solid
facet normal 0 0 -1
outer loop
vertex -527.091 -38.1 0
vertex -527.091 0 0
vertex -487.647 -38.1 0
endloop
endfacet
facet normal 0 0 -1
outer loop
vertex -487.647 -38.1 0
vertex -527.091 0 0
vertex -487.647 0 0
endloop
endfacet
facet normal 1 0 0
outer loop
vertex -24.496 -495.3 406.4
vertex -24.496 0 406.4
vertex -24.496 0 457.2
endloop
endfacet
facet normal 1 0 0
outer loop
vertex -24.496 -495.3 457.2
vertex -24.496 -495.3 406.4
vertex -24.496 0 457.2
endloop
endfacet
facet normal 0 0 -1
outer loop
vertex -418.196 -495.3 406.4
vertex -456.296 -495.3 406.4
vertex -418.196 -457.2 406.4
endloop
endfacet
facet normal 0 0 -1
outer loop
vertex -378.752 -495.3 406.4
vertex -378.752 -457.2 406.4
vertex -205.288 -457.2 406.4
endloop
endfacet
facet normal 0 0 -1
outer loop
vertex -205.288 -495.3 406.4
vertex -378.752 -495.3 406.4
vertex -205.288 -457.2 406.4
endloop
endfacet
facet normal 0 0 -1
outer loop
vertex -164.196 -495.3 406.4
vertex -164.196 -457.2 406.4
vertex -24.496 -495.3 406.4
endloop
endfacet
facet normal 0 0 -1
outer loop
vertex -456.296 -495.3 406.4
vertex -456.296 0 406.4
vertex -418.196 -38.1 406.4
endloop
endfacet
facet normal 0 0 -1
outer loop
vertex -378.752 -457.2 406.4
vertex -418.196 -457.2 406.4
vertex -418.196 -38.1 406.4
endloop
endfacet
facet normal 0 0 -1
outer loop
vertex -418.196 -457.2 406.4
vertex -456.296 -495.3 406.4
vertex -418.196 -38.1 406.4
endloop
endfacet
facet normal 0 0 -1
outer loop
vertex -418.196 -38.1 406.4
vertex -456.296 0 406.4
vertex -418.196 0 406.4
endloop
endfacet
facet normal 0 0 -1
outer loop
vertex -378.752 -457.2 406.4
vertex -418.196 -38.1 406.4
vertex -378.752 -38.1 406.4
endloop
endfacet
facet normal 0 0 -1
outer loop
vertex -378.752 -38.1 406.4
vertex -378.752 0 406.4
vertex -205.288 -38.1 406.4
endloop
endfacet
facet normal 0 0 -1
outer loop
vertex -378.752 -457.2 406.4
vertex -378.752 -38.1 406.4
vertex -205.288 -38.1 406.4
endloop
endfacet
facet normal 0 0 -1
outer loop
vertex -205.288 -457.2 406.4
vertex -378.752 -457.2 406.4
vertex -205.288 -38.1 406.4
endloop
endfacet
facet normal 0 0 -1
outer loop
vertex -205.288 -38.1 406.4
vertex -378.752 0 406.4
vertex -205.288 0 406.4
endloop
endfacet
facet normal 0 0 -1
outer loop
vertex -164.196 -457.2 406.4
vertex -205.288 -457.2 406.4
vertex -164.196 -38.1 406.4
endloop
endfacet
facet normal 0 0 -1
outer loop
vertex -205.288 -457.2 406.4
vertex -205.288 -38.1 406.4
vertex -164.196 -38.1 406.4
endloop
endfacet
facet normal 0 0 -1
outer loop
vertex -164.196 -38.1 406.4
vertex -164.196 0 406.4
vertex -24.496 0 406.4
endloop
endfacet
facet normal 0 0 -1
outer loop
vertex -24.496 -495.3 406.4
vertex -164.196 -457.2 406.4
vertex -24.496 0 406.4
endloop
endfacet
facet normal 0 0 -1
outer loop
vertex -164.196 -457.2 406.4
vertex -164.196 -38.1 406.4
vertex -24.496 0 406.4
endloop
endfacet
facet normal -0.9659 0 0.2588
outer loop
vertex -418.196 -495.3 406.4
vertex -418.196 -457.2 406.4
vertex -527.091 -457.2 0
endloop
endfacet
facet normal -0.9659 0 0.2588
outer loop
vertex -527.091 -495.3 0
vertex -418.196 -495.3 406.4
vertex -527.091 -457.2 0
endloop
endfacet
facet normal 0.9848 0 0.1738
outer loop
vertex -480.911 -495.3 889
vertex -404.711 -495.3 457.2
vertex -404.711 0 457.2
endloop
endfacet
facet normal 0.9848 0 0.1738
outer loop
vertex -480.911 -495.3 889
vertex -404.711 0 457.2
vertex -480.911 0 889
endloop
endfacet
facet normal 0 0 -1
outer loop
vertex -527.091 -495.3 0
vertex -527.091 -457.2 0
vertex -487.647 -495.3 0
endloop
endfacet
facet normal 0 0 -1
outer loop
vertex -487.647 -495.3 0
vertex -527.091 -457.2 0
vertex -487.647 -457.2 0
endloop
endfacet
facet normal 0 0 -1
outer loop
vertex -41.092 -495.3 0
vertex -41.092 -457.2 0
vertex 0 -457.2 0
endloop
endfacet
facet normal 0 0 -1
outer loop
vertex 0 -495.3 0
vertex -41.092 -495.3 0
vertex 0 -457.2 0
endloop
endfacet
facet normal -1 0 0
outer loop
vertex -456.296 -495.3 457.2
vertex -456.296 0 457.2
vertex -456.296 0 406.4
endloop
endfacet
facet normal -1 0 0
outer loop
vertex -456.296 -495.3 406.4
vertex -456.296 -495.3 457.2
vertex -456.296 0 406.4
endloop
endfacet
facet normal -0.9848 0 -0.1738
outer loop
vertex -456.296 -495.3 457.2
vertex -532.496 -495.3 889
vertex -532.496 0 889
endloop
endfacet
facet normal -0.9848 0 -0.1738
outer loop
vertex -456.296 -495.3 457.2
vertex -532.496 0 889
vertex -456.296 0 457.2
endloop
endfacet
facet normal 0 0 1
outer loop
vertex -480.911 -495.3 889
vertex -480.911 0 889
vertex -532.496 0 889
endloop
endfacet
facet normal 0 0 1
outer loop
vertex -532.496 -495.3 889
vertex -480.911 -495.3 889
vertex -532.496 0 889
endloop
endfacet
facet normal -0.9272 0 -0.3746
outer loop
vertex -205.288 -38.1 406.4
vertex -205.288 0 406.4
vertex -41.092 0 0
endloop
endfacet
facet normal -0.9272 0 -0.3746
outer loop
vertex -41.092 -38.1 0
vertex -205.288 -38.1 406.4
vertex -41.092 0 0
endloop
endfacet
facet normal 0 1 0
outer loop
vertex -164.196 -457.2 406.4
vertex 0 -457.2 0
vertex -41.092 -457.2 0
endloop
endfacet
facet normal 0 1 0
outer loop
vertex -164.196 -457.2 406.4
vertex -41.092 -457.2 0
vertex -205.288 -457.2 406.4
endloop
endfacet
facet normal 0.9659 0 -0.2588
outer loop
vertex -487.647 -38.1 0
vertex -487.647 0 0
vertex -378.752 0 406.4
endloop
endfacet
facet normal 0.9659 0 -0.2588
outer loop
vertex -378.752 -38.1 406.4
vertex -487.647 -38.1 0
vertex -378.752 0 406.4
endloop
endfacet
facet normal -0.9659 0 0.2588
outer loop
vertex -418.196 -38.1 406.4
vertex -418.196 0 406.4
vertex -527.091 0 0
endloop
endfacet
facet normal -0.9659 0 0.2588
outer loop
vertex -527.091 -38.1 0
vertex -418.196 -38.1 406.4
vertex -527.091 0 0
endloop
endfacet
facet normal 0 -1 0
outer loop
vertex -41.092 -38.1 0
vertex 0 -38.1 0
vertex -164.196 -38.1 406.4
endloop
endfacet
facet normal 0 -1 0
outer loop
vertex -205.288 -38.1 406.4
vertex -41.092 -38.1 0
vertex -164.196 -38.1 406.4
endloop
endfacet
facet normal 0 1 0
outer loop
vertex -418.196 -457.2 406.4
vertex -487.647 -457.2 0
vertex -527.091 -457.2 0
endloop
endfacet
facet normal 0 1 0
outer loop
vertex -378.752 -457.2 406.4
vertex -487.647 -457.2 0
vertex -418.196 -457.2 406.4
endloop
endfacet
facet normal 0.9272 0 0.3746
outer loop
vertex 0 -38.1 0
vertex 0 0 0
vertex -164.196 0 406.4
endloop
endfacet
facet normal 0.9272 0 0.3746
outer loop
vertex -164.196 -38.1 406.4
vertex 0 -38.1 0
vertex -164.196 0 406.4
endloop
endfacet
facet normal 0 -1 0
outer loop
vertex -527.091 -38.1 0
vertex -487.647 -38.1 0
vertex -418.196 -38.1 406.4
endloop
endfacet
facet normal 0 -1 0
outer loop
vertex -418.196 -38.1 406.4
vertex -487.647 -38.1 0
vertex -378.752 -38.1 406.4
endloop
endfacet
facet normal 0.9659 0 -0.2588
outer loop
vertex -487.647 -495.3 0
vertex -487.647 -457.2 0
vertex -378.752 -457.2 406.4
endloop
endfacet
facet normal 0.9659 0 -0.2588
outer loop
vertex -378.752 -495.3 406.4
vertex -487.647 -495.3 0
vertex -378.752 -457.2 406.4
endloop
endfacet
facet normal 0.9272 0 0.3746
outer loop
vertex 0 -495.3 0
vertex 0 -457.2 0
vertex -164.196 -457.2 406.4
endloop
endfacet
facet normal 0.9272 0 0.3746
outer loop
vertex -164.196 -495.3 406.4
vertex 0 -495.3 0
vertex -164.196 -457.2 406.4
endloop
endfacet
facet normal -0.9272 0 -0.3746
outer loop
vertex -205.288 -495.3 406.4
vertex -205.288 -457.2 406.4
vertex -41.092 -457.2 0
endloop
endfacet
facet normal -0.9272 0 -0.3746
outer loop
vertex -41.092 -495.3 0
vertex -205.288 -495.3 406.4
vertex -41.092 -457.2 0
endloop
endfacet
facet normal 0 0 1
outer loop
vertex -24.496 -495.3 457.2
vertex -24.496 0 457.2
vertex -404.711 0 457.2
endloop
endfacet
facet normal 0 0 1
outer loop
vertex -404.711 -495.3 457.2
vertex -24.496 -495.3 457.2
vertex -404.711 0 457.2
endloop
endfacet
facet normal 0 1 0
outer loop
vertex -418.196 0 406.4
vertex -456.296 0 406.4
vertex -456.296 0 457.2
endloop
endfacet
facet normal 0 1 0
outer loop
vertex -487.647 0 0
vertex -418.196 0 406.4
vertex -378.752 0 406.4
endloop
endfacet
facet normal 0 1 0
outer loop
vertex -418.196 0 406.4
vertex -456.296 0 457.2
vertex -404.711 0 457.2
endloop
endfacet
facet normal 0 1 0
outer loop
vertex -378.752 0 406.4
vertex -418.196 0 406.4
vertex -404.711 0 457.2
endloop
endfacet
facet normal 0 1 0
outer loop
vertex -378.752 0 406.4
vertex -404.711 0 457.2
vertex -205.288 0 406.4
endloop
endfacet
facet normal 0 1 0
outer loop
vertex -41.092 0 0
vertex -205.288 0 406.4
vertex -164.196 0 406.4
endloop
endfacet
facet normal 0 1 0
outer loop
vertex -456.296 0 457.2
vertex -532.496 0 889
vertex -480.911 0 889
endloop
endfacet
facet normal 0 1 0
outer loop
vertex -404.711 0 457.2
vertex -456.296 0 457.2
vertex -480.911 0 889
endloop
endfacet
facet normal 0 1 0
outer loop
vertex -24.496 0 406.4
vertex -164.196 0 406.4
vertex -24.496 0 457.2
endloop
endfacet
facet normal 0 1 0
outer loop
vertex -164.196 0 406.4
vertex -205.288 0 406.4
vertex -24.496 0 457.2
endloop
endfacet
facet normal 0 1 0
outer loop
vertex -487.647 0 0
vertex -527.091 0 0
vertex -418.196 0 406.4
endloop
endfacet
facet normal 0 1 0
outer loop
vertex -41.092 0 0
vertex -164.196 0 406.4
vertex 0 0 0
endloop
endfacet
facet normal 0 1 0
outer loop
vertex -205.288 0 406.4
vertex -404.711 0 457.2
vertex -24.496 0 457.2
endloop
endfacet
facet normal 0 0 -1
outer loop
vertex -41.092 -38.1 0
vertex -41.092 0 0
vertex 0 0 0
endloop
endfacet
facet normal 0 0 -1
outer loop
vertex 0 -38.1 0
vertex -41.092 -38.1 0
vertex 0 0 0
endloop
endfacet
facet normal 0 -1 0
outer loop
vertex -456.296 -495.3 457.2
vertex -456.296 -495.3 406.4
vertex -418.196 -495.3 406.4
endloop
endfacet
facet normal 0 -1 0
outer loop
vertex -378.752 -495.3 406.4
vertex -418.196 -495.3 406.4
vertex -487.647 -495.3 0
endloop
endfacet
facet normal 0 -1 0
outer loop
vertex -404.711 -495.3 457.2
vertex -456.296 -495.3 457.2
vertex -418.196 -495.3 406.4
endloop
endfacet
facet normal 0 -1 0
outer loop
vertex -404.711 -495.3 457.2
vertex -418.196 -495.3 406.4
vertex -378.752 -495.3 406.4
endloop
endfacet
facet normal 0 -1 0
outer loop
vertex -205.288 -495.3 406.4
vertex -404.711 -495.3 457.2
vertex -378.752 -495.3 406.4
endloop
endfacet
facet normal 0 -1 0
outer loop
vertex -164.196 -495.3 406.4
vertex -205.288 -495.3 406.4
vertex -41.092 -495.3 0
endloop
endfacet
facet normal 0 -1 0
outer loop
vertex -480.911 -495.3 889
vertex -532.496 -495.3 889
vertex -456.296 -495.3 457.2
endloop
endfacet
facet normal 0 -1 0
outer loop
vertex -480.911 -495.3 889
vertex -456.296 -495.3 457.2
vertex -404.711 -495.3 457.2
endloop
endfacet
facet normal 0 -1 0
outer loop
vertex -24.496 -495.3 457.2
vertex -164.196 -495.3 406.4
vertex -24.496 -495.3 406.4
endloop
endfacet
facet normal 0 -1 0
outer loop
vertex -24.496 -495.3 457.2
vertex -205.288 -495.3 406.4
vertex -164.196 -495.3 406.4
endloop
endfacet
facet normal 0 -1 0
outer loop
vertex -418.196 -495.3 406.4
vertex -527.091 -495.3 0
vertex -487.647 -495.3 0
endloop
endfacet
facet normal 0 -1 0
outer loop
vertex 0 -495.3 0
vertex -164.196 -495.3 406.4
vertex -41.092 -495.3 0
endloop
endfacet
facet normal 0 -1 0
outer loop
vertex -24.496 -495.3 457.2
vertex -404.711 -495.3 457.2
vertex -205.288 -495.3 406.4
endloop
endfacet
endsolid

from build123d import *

# Parameters (mm, degrees)
F1_DEPTH = 495.3
F2_W     = 419.1
F2_H     = 406.4
F3_DEPTH = 532.497258


with BuildPart() as f1:
    # F0 (on Front) → F1 (new body)
    with BuildSketch(Plane.XZ):
        Polygon((-404.711319, 457.2), (-480.911319, 889), (-532.496258, 889), (-456.296258, 457.2), (-456.296258, 406.4), (-418.196258, 406.4), (-378.752236, 406.4), (-205.288432, 406.4), (-164.196258, 406.4), (-24.496258, 406.4), (-24.496258, 457.2), align=None)
        Polygon((0, 0), (-164.196258, 406.4), (-205.288432, 406.4), (-41.092174, 0), align=None)
        Polygon((-378.752236, 406.4), (-418.196258, 406.4), (-527.09081, 0), (-487.646788, 0), align=None)
    extrude(amount=F1_DEPTH)

    # F2 (on Right) → F3 (cut, through all)
    with BuildSketch(Plane.YZ):
        with Locations((-247.65, 203.2)):
            Rectangle(F2_W, F2_H)
    extrude(amount=-F3_DEPTH, mode=Mode.SUBTRACT)


solid = f1.part
